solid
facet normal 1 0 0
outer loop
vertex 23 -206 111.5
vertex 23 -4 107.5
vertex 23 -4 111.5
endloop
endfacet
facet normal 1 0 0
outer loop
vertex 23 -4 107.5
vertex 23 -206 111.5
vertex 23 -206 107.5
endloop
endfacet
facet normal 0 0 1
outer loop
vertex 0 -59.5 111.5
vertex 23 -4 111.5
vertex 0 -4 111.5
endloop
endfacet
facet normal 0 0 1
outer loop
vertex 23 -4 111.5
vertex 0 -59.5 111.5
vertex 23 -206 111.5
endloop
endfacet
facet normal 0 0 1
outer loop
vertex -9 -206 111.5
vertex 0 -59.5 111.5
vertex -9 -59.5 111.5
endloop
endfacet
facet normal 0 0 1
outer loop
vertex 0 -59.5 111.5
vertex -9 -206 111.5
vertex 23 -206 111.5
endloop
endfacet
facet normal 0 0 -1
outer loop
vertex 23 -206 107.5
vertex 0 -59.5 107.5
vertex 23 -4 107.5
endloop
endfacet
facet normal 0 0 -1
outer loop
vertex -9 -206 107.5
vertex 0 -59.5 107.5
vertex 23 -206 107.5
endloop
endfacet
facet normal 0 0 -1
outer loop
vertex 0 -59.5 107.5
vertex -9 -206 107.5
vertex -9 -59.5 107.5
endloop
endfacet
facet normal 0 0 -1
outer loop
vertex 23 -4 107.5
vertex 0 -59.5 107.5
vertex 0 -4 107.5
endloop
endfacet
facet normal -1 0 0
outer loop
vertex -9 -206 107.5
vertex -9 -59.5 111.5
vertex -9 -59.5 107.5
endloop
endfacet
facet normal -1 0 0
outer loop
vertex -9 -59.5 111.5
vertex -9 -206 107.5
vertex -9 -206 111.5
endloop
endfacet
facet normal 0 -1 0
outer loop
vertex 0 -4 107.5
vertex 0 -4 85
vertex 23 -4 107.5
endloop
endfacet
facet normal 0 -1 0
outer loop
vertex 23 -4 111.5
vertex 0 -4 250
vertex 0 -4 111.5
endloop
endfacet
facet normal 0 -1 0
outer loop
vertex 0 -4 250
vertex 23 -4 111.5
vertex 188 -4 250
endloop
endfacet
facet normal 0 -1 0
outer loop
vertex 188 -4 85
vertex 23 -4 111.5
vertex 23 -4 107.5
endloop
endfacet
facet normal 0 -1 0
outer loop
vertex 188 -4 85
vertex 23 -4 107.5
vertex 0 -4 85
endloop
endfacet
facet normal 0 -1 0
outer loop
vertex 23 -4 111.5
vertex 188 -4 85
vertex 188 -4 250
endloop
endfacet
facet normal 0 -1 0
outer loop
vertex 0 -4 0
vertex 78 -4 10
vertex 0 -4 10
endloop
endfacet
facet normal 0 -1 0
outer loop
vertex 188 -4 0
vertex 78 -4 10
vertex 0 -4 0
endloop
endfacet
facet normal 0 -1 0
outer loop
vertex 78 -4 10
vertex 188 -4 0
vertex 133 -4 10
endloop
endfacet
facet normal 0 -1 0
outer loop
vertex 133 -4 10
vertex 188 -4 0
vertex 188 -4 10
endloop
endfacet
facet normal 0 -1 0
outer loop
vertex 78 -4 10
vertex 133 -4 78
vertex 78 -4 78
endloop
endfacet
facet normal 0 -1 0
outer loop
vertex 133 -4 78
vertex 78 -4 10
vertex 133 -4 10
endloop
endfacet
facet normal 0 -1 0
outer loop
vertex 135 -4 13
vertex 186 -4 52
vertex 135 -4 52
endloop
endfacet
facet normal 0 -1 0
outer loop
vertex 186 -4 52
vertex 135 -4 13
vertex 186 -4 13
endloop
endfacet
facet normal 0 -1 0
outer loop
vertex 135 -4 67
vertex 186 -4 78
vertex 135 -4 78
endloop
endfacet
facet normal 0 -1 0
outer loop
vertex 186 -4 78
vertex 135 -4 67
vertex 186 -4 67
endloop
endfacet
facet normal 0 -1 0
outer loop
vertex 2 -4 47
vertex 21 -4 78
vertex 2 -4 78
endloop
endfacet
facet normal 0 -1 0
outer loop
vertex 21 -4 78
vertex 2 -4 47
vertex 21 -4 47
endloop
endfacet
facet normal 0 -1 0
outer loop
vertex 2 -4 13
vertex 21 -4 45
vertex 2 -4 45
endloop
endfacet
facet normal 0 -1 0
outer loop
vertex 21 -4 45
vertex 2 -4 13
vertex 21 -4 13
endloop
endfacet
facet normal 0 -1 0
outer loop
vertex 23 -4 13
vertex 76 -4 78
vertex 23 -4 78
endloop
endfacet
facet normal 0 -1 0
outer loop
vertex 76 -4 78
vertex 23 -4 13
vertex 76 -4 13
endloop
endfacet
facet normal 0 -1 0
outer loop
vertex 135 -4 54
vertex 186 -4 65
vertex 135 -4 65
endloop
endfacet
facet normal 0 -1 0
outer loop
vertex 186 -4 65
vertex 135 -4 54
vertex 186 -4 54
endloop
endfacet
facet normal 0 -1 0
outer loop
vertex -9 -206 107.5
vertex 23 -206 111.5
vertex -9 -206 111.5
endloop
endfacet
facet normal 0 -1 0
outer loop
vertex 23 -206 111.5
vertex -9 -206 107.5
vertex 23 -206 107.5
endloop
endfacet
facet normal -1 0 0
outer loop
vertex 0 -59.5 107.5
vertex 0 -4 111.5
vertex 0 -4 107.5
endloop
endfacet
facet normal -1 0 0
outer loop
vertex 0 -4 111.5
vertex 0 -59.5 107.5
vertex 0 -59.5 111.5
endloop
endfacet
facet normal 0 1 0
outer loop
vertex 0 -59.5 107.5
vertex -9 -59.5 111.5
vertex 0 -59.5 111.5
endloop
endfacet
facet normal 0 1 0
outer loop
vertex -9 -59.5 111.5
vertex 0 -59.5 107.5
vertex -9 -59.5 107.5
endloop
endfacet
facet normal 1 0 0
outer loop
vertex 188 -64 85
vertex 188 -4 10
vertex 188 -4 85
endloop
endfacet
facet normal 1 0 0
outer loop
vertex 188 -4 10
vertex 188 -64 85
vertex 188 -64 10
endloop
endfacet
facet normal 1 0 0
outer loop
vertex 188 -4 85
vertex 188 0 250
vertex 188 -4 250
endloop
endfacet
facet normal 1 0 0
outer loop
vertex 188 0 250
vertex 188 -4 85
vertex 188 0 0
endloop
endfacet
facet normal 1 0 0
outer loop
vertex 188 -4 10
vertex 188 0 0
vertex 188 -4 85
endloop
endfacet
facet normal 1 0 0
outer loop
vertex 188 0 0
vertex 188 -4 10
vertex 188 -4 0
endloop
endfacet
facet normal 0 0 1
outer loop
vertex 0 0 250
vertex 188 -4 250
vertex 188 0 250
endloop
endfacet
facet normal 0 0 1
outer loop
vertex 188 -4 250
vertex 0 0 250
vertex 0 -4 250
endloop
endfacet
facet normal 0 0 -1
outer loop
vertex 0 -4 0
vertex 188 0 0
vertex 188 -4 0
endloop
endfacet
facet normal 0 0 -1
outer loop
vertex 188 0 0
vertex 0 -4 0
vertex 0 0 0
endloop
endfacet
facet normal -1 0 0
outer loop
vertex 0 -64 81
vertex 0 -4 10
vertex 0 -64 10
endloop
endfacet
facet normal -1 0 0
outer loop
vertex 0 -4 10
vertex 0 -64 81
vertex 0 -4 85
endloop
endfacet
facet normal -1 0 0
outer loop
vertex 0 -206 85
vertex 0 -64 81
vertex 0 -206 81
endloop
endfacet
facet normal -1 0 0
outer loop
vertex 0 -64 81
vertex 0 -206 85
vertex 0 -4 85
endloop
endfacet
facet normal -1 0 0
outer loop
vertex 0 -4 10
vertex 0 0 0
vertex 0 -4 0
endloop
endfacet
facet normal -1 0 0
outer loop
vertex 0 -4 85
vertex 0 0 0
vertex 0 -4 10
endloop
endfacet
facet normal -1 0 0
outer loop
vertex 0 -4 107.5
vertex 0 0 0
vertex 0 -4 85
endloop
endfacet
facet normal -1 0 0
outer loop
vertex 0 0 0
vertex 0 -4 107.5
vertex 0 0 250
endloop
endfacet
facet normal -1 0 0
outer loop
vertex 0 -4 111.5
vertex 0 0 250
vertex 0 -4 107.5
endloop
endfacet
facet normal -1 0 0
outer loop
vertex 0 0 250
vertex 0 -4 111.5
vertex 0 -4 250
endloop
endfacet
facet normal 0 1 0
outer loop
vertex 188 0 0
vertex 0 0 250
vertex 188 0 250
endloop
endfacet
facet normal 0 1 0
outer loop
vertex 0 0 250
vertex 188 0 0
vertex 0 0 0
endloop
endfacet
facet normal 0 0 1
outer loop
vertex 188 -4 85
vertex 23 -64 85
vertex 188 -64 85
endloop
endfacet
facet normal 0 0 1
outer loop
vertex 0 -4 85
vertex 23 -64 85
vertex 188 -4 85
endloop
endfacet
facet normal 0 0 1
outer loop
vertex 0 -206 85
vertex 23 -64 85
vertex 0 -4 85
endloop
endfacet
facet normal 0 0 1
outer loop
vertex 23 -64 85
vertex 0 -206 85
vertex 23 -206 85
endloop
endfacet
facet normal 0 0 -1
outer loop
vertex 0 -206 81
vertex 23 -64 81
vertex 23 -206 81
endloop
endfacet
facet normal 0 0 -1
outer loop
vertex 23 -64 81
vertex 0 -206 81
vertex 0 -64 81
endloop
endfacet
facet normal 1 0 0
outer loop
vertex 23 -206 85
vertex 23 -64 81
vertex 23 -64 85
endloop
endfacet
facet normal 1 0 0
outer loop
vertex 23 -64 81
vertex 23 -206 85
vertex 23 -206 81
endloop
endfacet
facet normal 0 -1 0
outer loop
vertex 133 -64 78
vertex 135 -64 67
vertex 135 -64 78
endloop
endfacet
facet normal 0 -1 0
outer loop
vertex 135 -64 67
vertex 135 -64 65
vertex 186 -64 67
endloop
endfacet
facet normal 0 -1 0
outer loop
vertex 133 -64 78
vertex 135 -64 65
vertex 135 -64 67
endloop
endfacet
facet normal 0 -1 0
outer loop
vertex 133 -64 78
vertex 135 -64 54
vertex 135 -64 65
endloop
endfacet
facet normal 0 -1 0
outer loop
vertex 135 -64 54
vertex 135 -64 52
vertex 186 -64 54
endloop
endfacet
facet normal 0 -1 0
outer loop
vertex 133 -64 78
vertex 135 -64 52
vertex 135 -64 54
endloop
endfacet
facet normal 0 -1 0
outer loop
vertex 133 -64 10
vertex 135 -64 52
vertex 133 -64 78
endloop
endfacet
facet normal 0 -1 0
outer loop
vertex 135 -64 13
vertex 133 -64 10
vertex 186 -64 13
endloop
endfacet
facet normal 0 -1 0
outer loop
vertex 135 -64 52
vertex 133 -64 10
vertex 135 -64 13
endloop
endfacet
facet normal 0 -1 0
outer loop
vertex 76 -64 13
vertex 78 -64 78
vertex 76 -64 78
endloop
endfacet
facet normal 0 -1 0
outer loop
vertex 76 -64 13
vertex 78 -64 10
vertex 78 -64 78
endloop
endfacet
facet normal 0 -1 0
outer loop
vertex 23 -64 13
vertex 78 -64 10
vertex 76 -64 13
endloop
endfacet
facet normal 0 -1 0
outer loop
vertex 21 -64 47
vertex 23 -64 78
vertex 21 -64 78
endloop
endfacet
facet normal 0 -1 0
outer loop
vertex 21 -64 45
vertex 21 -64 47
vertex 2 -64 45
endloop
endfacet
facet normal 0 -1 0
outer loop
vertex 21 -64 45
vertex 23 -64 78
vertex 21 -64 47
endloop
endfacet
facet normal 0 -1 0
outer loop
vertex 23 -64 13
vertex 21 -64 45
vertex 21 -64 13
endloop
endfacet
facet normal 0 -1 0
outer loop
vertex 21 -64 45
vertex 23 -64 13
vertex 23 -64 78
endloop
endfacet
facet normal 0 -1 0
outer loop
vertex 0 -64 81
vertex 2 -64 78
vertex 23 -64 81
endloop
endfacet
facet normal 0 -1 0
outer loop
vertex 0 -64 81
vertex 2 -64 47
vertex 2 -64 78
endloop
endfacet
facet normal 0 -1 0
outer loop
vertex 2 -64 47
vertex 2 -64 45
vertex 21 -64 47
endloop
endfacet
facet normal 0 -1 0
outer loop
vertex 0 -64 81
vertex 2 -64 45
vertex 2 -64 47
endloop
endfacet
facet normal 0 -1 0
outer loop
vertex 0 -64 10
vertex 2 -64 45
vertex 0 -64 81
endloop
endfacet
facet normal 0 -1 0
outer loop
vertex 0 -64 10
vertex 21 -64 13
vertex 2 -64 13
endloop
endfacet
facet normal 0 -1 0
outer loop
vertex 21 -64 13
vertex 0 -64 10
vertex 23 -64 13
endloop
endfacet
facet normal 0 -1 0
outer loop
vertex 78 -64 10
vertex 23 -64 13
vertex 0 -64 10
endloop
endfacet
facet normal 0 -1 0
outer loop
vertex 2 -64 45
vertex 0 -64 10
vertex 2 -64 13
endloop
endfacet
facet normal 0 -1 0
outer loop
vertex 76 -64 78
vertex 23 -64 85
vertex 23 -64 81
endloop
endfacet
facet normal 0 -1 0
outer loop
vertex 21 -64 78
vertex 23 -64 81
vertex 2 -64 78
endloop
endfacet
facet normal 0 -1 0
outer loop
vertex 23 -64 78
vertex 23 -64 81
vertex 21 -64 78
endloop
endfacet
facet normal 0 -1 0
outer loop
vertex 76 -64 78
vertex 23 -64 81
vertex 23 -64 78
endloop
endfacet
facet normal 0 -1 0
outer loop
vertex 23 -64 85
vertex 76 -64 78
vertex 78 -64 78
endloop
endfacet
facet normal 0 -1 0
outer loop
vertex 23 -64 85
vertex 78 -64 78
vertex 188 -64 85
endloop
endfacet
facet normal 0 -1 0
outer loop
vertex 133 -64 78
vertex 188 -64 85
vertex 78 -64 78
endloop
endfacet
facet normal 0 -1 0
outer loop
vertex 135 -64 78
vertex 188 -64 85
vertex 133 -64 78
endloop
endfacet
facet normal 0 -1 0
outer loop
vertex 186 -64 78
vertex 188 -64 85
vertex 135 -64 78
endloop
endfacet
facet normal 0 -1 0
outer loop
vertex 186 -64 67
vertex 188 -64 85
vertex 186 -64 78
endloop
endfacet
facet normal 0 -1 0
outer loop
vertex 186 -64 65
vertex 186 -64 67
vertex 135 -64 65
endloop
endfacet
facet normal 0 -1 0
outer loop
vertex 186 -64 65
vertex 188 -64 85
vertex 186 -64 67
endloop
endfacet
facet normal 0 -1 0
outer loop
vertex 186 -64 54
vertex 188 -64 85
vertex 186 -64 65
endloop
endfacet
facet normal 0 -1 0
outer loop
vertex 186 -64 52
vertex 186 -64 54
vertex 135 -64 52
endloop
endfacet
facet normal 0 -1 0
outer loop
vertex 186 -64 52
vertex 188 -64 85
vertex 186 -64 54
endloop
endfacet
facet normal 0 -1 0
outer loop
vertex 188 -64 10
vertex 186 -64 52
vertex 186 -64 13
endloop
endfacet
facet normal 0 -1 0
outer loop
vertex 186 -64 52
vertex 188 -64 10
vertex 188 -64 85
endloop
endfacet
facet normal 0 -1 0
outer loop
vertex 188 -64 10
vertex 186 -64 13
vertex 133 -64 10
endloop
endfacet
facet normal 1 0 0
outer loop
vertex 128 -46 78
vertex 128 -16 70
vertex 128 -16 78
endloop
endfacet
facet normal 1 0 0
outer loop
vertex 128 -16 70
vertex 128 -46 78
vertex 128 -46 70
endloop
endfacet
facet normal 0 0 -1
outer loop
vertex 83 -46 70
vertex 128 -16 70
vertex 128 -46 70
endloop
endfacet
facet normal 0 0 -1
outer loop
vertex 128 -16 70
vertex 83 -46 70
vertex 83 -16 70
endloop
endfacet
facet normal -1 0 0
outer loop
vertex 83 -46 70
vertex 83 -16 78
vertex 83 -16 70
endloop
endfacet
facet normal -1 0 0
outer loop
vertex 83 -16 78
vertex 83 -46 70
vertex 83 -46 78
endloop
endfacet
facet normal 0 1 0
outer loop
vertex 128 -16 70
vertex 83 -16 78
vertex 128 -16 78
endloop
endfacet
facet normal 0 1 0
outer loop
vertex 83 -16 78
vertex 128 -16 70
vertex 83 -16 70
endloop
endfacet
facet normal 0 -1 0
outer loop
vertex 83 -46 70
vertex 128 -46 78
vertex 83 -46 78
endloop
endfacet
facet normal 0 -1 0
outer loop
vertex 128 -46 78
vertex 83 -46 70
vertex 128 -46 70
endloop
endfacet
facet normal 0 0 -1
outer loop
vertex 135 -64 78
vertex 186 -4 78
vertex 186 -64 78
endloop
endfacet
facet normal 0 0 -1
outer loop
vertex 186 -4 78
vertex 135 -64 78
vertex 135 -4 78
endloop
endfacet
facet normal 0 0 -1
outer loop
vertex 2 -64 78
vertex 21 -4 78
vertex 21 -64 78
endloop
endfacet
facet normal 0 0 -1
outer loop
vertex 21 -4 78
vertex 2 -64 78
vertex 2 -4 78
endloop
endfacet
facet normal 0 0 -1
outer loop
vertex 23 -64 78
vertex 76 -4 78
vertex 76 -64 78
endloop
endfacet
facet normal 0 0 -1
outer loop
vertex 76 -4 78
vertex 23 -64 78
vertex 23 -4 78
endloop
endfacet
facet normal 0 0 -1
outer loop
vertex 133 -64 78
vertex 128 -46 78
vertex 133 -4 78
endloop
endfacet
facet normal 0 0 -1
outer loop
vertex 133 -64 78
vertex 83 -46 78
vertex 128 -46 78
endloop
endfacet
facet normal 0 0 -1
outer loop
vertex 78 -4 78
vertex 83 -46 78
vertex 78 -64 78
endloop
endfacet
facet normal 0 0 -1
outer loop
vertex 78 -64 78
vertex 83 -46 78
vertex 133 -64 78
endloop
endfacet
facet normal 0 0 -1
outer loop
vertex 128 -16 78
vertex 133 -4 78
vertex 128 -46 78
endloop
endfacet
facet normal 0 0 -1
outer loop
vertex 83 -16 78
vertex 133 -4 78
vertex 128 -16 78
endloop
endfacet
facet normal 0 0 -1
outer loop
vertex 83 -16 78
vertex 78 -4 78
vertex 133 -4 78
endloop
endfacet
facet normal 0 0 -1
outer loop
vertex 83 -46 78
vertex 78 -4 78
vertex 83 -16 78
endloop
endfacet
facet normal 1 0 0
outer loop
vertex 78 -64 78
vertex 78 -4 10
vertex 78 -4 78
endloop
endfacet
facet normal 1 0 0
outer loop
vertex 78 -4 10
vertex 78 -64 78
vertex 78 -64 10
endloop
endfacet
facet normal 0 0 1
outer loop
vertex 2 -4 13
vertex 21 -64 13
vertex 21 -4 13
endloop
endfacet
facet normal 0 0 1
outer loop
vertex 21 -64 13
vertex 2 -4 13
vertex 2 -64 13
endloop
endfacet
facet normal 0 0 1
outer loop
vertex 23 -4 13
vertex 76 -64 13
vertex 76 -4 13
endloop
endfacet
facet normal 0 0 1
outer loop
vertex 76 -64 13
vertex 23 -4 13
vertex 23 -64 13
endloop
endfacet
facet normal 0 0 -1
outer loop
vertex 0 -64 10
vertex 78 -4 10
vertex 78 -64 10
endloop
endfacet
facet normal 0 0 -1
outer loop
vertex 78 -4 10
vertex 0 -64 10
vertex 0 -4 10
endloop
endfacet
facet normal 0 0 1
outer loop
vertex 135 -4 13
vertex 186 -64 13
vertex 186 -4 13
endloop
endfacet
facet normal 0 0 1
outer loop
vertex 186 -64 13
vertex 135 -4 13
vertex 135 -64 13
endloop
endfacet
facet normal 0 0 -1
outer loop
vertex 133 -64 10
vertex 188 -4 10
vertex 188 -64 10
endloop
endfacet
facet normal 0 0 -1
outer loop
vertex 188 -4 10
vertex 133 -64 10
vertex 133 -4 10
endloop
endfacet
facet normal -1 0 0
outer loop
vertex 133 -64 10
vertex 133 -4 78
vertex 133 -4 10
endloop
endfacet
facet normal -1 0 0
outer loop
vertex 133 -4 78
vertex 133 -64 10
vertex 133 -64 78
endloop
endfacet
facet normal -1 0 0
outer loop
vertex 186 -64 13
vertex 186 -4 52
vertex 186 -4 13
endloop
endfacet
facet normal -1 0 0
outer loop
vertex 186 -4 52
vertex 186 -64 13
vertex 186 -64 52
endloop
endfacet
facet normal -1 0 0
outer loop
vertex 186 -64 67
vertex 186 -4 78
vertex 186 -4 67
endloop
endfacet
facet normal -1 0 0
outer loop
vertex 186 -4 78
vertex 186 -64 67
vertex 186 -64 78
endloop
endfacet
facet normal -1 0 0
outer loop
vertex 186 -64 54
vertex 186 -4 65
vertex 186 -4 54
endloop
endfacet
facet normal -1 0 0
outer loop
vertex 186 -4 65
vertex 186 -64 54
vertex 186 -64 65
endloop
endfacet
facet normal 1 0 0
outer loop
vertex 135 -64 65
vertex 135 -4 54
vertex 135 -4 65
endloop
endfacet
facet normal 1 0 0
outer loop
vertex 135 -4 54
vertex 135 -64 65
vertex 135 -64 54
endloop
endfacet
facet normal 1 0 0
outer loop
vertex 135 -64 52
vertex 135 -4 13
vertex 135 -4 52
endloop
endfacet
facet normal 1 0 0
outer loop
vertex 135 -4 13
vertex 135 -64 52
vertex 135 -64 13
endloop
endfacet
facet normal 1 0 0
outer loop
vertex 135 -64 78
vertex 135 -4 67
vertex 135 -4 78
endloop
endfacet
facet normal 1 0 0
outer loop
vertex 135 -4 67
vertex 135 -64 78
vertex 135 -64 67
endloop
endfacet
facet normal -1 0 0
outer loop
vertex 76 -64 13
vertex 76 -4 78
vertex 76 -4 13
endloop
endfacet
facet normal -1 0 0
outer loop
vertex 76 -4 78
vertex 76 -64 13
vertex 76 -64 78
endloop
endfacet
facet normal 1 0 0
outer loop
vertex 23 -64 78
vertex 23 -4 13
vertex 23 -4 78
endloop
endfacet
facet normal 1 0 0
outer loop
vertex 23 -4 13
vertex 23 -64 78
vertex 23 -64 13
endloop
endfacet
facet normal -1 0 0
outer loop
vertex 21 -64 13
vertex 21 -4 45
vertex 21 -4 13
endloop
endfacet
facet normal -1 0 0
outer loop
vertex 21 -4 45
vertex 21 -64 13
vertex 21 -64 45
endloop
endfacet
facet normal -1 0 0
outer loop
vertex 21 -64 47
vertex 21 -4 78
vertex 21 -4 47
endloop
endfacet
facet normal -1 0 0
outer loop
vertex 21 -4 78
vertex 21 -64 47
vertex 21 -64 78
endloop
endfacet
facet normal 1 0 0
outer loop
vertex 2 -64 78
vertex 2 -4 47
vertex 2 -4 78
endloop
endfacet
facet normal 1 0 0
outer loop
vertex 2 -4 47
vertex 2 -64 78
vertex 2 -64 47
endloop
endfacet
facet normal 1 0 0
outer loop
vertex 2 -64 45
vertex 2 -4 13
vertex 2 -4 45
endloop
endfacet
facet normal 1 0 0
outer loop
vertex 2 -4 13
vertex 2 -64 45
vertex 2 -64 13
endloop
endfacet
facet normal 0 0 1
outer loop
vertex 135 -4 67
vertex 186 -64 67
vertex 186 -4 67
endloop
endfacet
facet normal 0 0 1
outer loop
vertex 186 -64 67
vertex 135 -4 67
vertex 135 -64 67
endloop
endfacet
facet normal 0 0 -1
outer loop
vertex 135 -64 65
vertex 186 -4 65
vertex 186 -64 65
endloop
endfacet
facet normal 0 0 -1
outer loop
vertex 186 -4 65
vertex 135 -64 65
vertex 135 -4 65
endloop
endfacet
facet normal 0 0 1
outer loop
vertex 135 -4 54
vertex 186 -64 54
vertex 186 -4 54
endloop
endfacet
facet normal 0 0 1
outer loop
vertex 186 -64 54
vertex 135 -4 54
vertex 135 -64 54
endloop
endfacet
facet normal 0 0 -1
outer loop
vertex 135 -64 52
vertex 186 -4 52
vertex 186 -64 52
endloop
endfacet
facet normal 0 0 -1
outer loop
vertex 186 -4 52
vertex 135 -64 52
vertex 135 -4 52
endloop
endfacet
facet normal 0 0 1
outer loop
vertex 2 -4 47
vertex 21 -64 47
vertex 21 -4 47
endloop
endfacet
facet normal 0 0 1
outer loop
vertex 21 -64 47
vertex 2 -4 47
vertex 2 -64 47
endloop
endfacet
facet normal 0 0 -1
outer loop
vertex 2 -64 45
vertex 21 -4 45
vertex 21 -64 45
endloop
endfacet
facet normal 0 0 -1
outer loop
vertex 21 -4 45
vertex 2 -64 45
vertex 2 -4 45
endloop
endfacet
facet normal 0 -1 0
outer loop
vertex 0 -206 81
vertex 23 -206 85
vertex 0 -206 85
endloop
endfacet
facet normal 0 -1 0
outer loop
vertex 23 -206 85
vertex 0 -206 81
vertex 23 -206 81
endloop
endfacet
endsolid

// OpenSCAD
//base parede
color("#e15b40"){ translate([0,-4,0]) cube([188,4,250]);} 

//pedra pia
color("#7b7b7b"){ translate([23,-64,81]) cube([165,60,4]);}
color("#7b7b7b"){ translate([83,-46, 70]) cube([45,30,15]);}

//topo armarios debaixo da pia
color("#5a2c00"){ translate([0,-64,78]) cube([188,60,3]);}

//base armarios debaixo da pia
color("#5a2c00"){ translate([0,-64,10]) cube([78,60,3]);}
color("#5a2c00"){ translate([133,-64,10]) cube([55,60,3]);}

//divisórias verticais
color("#87501d"){ translate([186,-64,78]) rotate([0,90,0]) cube([65,60,2]);}
color("#87501d"){ translate([133,-64,78]) rotate([0,90,0]) cube([65,60,2]);}
color("#87501d"){ translate([76,-64,78]) rotate([0,90,0]) cube([65,60,2]);}
color("#87501d"){ translate([21,-64,78]) rotate([0,90,0]) cube([65,60,2]);}
color("#87501d"){ translate([0,-64,78]) rotate([0,90,0]) cube([65,60,2]);}

//divisórias gaveteiros
color("#a56527"){ translate([135,-64,65]) cube([51,60,2]);}
color("#a56527"){ translate([135,-64,52]) cube([51,60,2]);}
color("#a56527"){ translate([2,-64,45]) cube([19,60,2]);}

//bancada embaixo
color("#b96f27"){ translate([0,-206,81]) cube([23,202,4]);}


//bancada em cima
difference(){
   color("#b96f27"){ translate([-9,-206,107.5]) cube([32,202,4]);}
    translate([-9,-59.5,107.5]) cube([9,55.5,4]);
    
}
